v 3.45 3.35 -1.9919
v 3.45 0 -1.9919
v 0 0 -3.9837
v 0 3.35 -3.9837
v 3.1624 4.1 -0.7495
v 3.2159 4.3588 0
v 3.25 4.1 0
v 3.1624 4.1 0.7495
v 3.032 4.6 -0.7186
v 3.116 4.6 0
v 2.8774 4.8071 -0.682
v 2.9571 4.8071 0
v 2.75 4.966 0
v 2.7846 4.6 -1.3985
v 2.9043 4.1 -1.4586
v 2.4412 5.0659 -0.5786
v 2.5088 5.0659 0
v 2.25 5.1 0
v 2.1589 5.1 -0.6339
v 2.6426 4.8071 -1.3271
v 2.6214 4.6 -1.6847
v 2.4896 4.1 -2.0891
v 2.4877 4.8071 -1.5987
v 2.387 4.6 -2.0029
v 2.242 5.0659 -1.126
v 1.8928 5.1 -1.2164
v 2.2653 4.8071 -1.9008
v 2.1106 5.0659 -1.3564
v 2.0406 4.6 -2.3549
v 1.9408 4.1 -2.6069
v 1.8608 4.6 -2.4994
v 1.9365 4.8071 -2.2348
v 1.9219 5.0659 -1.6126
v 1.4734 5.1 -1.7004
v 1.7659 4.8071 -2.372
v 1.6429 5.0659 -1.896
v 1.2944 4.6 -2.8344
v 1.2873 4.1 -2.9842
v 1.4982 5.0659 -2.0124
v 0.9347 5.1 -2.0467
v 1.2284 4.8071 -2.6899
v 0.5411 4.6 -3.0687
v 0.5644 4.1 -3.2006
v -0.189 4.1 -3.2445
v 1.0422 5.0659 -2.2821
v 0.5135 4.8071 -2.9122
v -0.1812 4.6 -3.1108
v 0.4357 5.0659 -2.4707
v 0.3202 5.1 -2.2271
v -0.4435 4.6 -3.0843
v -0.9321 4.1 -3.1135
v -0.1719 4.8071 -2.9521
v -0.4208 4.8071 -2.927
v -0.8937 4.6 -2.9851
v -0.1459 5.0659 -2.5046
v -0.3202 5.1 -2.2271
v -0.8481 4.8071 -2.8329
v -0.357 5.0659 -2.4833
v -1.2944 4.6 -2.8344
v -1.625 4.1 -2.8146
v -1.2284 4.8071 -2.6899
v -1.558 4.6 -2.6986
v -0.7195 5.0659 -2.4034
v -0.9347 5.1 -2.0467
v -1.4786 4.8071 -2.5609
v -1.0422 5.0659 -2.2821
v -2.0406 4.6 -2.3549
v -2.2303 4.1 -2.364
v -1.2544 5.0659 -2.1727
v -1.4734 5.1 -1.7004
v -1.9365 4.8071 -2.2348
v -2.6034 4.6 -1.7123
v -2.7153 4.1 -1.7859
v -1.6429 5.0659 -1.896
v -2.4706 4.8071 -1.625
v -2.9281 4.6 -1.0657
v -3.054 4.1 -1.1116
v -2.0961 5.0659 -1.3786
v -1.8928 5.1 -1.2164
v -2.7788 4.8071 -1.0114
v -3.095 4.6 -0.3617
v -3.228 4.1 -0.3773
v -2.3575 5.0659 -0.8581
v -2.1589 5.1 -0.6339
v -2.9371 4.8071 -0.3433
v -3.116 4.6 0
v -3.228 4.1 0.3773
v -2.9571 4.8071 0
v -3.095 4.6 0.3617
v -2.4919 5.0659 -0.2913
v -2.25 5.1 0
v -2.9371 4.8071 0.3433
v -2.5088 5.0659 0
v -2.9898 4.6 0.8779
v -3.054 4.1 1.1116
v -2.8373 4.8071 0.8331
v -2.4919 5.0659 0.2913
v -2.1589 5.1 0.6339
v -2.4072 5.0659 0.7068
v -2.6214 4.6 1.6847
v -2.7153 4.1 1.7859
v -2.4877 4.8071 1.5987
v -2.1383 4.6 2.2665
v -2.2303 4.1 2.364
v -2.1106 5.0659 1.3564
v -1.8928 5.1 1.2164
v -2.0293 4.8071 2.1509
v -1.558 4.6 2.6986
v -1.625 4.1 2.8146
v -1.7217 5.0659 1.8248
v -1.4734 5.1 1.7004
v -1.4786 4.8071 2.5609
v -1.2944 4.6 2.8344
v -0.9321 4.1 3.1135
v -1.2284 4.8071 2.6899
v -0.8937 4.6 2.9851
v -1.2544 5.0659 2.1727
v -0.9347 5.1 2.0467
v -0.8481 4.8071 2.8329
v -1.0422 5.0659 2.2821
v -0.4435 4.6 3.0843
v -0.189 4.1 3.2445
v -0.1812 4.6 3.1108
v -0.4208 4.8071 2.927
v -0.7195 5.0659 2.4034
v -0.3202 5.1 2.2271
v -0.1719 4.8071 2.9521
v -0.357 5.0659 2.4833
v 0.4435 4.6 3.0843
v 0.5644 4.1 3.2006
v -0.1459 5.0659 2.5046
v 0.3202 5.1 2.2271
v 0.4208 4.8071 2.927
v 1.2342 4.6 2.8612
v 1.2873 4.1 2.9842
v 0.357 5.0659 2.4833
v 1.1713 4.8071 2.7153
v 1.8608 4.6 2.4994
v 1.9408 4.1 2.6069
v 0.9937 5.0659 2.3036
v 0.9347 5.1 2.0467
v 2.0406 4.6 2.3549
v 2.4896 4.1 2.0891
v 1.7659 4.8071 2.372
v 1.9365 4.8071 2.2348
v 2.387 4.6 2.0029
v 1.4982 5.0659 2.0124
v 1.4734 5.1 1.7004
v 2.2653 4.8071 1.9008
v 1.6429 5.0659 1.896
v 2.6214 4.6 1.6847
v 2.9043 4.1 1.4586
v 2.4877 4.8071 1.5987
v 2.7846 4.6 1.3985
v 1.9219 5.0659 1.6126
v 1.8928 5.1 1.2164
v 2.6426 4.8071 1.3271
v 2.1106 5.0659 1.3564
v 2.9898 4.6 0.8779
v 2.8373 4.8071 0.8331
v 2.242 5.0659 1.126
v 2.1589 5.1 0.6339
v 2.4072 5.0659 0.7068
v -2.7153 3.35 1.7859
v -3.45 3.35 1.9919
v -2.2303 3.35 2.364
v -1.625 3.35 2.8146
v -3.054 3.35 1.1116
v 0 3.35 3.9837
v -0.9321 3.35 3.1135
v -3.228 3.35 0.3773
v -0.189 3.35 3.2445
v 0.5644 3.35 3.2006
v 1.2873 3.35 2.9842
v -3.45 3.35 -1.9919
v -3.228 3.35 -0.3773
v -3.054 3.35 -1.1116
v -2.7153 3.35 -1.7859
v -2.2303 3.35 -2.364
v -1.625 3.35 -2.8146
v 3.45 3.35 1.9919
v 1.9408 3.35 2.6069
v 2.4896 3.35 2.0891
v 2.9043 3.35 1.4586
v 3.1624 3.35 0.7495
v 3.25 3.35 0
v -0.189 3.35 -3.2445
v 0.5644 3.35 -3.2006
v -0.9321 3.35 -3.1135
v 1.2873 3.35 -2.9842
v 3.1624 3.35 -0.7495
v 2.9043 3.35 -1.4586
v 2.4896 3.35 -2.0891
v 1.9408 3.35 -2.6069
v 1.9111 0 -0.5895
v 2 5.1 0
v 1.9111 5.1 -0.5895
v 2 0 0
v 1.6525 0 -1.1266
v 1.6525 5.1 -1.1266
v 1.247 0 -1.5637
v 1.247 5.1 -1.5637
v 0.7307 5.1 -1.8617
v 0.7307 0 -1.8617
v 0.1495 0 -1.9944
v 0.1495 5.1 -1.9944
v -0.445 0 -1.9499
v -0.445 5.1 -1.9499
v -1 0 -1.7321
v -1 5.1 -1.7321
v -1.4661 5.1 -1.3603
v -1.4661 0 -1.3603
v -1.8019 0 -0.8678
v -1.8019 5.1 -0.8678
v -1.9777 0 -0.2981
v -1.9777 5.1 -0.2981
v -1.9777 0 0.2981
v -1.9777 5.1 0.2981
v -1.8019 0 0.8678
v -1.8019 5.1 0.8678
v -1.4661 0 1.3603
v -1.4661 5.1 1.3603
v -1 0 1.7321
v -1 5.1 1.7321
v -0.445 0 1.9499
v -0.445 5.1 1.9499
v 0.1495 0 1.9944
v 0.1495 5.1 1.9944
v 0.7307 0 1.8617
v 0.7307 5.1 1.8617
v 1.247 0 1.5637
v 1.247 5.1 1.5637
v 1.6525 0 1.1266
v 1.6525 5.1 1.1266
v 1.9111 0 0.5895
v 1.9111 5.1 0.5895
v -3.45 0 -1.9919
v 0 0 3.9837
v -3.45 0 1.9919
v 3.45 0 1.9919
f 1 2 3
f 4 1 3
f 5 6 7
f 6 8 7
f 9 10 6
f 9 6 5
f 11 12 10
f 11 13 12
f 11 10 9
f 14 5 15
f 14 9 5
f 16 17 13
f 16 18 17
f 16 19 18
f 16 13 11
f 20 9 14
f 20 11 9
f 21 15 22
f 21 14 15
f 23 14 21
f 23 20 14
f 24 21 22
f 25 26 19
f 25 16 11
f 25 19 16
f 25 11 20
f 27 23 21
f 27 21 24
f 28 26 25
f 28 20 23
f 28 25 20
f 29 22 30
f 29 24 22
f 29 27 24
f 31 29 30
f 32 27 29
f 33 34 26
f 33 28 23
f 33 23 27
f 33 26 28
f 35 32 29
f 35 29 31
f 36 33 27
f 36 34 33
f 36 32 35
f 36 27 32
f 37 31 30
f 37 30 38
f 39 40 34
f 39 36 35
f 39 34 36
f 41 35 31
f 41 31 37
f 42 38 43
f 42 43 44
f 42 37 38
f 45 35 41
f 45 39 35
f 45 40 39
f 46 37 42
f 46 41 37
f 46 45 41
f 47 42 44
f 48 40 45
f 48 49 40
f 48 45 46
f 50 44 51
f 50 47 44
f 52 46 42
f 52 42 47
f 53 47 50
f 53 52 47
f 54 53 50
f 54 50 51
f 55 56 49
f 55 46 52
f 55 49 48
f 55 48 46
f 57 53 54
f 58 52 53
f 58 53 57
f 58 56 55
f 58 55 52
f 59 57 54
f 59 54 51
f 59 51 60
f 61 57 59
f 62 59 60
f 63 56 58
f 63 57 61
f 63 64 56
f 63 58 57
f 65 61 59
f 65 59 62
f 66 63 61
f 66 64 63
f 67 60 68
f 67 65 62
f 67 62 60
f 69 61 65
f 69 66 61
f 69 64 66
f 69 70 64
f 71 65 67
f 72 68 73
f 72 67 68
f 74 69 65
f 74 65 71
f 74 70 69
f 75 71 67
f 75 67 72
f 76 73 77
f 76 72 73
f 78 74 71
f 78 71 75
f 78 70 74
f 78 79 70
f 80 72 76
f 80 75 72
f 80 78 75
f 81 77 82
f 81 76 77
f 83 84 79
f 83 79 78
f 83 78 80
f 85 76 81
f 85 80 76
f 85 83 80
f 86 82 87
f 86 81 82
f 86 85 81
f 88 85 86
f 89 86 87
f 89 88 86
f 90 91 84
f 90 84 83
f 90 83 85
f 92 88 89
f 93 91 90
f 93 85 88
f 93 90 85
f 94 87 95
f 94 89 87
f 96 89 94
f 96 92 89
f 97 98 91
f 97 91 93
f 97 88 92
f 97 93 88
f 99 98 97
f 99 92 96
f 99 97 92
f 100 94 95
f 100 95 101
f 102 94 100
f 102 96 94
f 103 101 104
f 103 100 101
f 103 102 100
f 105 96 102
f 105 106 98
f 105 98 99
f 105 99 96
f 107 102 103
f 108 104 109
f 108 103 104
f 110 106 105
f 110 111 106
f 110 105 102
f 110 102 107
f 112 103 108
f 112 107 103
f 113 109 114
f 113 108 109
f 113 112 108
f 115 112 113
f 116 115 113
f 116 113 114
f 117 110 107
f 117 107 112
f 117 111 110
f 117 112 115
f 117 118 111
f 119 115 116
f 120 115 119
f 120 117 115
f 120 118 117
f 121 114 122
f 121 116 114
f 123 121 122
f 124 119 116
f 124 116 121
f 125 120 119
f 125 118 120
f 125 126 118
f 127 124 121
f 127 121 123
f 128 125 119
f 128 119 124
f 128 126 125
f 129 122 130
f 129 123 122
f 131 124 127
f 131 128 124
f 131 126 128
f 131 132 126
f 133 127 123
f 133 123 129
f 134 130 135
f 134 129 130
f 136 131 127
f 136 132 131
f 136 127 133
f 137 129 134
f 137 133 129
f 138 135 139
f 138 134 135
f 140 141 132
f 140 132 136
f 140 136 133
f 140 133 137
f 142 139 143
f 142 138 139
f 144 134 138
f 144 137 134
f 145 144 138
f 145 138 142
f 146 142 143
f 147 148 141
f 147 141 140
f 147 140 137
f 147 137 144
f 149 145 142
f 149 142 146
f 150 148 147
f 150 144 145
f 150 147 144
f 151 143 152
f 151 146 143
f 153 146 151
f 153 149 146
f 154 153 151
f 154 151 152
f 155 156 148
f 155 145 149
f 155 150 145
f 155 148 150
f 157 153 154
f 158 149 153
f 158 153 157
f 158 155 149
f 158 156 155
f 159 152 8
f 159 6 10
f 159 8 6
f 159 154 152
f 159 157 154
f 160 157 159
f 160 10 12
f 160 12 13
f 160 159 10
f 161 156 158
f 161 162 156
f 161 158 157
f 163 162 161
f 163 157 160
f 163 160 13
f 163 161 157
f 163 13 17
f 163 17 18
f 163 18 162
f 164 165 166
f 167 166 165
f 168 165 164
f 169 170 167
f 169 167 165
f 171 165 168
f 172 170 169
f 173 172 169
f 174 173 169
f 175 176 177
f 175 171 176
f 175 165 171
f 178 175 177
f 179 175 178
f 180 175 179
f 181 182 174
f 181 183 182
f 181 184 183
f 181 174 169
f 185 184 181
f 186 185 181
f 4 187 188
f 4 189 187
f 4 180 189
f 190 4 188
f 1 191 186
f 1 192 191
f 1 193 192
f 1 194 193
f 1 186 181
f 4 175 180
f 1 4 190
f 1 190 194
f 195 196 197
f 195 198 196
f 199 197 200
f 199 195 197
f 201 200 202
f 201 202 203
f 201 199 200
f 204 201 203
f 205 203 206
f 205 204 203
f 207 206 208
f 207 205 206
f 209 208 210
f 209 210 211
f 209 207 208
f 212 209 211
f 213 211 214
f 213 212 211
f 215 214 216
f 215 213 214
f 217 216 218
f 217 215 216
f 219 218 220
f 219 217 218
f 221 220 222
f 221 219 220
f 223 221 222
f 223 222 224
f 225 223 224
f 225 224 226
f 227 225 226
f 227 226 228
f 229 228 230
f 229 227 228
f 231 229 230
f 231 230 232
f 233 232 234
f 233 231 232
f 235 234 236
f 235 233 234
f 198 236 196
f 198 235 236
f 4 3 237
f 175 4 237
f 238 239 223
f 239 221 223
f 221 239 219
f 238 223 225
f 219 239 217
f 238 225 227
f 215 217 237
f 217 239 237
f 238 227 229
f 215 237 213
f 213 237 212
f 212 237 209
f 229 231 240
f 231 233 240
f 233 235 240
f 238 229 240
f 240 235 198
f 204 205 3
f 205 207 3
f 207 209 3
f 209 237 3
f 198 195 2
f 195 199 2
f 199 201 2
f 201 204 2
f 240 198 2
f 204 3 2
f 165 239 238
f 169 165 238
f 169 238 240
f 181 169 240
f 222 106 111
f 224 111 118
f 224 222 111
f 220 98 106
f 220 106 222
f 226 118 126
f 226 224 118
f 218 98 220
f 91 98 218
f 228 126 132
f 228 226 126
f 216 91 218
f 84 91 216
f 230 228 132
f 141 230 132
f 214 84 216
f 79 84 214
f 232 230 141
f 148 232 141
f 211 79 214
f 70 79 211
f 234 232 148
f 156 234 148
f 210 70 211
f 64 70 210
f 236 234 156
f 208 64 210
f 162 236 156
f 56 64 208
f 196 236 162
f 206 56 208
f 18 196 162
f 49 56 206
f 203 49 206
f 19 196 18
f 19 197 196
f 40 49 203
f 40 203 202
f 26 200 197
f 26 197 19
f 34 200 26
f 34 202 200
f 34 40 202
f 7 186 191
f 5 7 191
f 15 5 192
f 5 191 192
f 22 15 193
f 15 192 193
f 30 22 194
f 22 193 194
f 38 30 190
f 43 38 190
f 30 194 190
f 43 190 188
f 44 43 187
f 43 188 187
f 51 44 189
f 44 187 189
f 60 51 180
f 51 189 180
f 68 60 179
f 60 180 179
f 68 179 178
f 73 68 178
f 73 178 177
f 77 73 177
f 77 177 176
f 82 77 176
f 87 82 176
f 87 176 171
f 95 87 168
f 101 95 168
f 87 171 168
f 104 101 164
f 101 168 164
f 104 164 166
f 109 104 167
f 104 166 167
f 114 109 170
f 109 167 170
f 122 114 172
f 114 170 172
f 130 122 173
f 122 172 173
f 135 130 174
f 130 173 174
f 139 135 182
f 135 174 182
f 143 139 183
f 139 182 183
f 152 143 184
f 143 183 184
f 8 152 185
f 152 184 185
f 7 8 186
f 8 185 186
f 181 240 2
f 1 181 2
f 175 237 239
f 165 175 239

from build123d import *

# Parameters (mm, degrees)
SKETCH1_R           = 2
BOSS_EXTRUDE1_DEPTH = 3.35
SKETCH2_R           = 3.25
SKETCH2_R_2         = 2
BOSS_EXTRUDE2_DEPTH = 1.75
FILLET1_R           = 1


with BuildPart() as part:
    # Sketch1 → Boss-Extrude1 (new body)
    with BuildSketch(Plane(origin=(0, 0, 0), x_dir=(1, 0, 0), z_dir=(0, 1, 0))):
        Polygon((0, 3.983716857), (-3.45, 1.991858429), (-3.45, -1.991858429), (0, -3.983716857), (3.45, -1.991858429), (3.45, 1.991858429), align=None)
        Circle(SKETCH1_R, mode=Mode.SUBTRACT)
    extrude(amount=BOSS_EXTRUDE1_DEPTH)

    # Sketch2 → Boss-Extrude2 (add)
    with BuildSketch(Plane(origin=(0, 3.35, 0), x_dir=(1, 0, 0), z_dir=(0, 1, 0))):
        Circle(SKETCH2_R)
        Circle(SKETCH2_R_2, mode=Mode.SUBTRACT)
    extrude(amount=BOSS_EXTRUDE2_DEPTH)

    # Fillet1
    fillet1_edges = [part.edges().sort_by_distance(p)[0] for p in [
        (-3.25, 5.1, 0),
    ]]
    fillet(fillet1_edges, radius=FILLET1_R)


solid = part.part
